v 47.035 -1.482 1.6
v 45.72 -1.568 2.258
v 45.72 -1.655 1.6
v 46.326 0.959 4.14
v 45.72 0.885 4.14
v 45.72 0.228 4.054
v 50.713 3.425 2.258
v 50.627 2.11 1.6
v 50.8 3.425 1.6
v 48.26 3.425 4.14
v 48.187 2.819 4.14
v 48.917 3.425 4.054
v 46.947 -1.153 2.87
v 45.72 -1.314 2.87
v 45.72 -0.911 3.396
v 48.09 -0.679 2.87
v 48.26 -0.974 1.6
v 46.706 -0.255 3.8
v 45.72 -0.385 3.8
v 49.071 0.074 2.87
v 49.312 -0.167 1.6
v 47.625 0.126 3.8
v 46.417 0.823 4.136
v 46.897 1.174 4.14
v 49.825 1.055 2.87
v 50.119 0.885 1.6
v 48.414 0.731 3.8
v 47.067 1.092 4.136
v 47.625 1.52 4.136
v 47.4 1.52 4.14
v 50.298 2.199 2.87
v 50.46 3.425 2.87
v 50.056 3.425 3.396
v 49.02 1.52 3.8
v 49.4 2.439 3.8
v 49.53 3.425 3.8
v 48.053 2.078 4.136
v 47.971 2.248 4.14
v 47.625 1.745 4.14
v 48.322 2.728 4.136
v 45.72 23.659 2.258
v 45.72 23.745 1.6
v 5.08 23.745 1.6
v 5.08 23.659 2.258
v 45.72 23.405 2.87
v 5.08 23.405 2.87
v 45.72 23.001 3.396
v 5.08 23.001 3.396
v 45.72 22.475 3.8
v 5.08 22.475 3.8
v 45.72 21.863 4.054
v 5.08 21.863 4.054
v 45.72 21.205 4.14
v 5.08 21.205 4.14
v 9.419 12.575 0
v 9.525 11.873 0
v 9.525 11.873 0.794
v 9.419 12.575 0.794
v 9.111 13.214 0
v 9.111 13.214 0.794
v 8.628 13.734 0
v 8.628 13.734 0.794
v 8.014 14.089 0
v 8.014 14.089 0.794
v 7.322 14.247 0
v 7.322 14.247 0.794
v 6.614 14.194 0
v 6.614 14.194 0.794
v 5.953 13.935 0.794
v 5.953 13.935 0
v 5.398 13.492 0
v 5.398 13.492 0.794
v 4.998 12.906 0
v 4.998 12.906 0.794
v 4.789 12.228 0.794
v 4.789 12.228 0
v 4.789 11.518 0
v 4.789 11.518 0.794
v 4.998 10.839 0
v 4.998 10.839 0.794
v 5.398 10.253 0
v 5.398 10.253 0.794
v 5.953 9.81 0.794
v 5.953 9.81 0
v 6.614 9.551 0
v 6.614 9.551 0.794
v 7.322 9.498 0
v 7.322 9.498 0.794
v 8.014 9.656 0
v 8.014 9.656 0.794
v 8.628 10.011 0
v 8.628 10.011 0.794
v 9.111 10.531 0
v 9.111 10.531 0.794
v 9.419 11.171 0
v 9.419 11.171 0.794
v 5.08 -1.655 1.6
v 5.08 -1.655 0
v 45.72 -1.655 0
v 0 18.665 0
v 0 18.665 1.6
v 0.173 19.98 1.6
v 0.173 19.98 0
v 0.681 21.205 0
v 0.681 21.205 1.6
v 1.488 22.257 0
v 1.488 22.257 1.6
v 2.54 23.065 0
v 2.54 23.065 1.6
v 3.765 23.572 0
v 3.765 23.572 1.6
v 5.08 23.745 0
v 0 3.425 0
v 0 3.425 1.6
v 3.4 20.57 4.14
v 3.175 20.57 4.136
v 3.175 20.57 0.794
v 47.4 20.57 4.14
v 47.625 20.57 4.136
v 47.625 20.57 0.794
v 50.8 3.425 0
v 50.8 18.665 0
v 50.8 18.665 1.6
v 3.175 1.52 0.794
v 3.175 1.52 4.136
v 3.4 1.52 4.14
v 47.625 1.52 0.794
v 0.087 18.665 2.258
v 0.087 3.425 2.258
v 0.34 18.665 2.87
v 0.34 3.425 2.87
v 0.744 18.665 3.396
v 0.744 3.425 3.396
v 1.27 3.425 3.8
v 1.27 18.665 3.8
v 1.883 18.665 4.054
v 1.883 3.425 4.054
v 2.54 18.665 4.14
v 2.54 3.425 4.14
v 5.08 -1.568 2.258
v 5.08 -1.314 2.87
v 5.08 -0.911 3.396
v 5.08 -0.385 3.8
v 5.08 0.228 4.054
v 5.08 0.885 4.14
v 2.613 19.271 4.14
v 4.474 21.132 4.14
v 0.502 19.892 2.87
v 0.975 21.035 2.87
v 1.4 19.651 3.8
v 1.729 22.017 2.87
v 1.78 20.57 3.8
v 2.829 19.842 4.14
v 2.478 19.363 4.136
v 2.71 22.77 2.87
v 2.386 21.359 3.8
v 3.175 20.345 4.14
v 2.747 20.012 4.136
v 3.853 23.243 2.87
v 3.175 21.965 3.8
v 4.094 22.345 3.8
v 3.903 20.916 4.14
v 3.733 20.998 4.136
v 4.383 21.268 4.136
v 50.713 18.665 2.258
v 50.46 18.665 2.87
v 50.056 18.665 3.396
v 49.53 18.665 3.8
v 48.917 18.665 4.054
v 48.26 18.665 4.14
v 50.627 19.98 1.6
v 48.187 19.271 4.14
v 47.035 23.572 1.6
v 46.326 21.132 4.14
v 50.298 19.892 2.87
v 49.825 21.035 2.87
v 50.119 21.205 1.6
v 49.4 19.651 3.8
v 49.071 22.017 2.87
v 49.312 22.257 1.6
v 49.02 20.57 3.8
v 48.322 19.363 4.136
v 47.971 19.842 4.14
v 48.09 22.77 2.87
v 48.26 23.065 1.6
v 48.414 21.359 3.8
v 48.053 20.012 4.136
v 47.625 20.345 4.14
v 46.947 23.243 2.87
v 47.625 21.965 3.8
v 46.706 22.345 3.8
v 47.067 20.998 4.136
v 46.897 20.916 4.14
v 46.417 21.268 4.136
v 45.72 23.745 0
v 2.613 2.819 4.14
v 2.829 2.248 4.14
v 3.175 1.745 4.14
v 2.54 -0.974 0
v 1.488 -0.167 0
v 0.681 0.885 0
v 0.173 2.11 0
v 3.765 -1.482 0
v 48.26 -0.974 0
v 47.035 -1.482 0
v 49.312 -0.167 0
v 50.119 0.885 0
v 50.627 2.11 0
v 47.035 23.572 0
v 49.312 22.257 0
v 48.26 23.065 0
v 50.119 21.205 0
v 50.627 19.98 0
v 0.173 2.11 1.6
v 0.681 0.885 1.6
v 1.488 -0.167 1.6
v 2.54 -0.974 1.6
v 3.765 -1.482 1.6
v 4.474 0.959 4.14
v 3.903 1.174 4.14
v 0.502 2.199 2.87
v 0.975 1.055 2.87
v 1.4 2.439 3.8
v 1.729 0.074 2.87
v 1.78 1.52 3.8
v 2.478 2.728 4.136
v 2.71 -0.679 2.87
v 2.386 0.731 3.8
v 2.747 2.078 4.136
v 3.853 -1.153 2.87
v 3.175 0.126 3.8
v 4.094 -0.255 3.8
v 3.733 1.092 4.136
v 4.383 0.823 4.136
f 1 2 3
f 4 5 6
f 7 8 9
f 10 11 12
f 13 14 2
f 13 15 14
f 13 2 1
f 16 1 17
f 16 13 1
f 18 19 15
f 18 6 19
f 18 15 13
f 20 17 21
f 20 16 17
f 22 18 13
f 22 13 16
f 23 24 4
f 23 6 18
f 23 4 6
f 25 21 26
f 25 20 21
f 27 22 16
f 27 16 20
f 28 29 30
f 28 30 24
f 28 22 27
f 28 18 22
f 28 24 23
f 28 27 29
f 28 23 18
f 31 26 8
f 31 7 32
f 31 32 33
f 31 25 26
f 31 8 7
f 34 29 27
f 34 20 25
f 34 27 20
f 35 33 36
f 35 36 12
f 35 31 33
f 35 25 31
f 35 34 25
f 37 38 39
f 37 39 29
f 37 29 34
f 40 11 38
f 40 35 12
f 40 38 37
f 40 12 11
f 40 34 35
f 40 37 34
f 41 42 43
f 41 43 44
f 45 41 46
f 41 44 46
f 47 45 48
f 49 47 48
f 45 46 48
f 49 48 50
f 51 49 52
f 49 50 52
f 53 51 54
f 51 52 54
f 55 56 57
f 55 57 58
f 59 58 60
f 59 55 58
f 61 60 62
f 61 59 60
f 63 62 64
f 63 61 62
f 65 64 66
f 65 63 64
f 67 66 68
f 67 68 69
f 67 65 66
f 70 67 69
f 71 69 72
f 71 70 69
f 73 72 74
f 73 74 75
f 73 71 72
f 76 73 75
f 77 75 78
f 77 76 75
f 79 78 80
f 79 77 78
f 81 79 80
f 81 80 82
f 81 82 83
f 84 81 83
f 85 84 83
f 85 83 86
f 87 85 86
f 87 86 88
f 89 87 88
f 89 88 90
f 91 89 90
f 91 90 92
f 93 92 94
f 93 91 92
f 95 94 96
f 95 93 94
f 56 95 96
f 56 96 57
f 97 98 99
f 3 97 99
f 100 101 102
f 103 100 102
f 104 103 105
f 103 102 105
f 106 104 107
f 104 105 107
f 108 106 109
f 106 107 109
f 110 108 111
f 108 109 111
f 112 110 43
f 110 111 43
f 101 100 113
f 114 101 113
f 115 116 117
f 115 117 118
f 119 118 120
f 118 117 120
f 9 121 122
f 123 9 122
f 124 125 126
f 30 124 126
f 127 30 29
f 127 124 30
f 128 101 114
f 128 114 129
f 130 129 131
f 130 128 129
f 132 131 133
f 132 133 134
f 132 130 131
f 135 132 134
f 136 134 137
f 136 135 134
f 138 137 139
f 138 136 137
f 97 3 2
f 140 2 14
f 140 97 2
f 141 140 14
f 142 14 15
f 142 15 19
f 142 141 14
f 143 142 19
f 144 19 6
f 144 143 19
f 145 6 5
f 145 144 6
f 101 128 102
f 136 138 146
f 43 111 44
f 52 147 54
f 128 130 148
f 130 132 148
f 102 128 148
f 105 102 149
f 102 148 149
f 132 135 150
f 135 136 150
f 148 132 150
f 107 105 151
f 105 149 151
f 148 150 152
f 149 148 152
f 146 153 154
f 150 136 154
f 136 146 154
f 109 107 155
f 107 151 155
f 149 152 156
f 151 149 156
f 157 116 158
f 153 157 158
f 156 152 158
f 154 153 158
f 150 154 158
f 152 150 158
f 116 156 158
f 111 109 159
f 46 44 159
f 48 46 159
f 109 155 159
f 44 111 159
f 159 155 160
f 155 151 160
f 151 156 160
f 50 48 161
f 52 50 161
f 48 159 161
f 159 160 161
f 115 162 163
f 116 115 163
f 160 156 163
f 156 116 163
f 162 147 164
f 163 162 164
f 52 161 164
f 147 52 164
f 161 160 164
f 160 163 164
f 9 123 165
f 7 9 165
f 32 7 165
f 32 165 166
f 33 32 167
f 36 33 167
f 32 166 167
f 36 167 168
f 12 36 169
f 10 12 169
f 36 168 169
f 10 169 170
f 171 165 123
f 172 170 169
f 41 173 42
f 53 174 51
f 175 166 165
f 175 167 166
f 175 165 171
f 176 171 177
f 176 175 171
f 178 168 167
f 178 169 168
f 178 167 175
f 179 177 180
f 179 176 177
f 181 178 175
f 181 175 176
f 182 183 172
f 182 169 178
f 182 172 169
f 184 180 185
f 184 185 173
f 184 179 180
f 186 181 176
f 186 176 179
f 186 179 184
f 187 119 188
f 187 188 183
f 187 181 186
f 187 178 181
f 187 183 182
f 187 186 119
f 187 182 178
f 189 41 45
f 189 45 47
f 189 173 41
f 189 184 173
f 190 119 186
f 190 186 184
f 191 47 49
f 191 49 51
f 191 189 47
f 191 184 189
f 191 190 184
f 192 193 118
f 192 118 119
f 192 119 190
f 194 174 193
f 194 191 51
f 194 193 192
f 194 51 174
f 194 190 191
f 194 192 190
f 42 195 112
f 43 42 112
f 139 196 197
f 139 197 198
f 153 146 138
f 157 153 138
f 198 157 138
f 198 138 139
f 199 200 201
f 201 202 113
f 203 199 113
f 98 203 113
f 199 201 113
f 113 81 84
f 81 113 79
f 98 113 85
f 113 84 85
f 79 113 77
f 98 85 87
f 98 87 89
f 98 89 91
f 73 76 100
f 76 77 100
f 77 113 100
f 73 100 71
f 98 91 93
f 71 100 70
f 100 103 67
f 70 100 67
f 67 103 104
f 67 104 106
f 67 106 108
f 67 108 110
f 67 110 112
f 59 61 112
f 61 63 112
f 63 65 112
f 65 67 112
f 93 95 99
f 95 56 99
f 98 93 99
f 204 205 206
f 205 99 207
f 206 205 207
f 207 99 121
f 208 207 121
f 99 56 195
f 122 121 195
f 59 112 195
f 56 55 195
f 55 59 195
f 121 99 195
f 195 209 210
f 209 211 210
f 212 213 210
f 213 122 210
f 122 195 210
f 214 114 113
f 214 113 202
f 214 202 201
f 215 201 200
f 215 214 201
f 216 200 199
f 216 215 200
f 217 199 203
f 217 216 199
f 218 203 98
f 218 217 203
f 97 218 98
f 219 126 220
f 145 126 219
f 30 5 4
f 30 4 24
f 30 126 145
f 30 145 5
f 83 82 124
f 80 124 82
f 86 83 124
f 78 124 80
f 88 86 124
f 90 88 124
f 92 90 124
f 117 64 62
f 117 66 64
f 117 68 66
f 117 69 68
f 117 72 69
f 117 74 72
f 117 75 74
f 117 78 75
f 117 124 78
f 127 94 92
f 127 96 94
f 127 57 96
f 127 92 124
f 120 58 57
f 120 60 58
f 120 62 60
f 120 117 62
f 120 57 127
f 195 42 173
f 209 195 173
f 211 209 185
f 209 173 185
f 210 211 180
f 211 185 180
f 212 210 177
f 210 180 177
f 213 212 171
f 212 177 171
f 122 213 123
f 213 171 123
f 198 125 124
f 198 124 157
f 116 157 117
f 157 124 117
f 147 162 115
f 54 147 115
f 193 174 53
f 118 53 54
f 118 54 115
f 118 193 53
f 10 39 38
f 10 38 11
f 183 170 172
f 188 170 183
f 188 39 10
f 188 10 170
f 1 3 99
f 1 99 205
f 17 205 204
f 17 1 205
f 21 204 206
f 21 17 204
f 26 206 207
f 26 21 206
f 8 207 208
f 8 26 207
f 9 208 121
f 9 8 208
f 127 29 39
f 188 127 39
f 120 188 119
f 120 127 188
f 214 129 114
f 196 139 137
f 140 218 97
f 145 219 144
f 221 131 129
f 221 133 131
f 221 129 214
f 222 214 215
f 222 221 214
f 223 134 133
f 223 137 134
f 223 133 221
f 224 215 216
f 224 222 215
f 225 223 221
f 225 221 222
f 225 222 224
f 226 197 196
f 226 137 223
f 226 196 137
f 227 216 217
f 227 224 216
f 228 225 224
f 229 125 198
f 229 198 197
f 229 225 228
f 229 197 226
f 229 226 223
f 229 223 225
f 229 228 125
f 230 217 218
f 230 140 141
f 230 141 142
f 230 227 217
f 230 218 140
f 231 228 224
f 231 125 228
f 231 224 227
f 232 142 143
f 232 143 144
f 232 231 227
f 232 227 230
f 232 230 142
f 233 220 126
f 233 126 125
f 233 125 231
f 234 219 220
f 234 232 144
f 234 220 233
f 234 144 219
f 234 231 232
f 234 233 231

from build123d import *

# Parameters (mm, degrees)
F0_W         = 44.45
F0_H         = 19.05
F0_R         = 2.38125
F1_DEPTH     = 0.79375
F2_DEPTH     = 4.1402
F3_R         = 5.08
F4_T1_DEPTH  = 40.64
F4_T3_DEPTH  = 15.24
F4_T6_ANGLE  = 90
F4_T8_ANGLE  = 90
F4_T10_ANGLE = 90
F4_T12_ANGLE = 90


# Not quite as in the source:
# - a fillet or chamfer that OpenCascade refuses, or shapes differently, is made with other operations: its cross-section is extruded or revolved along the edge and cut away or added


with BuildPart() as f1:
    # F0 (on Top) → F1 (new body)
    with BuildSketch(Plane.XY):
        with Locations((25.4, 11.0452919405)):
            Rectangle(F0_W, F0_H)
        with Locations((7.14375, 11.8726459702)):
            Circle(F0_R, mode=Mode.SUBTRACT)
    extrude(amount=F1_DEPTH)

    # F0 (on Top) → F2 (join)
    with BuildSketch(Plane.XY):
        Polygon((0, 23.7452919405), (0, 0), (0, -1.6547080595), (50.8, -1.6547080595), (50.8, 23.7452919405), align=None)
        with Locations((25.4, 11.0452919405)):
            Rectangle(F0_W, F0_H, mode=Mode.SUBTRACT)
    extrude(amount=F2_DEPTH)

    # F3
    f3_edges = [f1.edges().sort_by_distance(p)[0] for p in [
        (50.8, -1.654708, 2.0701),
        (0, -1.654708, 2.0701),
        (50.8, 23.745292, 2.0701),
        (0, 23.745292, 2.0701),
    ]]
    fillet(f3_edges, radius=F3_R)

    # F4: fillet of radius 2.54 on 8 edges, made by hand

    # F4_s2 → F4_t1 (cut)
    with BuildSketch(Plane.YZ.offset(5.08)):
        with BuildLine():
            ThreePointArc((-1.6547080595, 1.6002), (-0.9107592837, 3.3962512242), (0.8852919405, 4.1402))
            Line((0.8852919405, 4.1402), (-1.6547080595, 4.1402))
            Line((-1.6547080595, 4.1402), (-1.6547080595, 1.6002))
        make_face()
        with BuildLine():
            ThreePointArc((23.7452919405, 1.6002), (23.0013431647, 3.3962512242), (21.2052919405, 4.1402))
            Line((21.2052919405, 4.1402), (23.7452919405, 4.1402))
            Line((23.7452919405, 4.1402), (23.7452919405, 1.6002))
        make_face()
    extrude(amount=F4_T1_DEPTH, mode=Mode.SUBTRACT)

    # F4_s4 → F4_t3 (cut)
    with BuildSketch(Plane.XZ.offset(-18.6652919405)):
        with BuildLine():
            ThreePointArc((0, 1.6002), (0.7439487758, 3.3962512242), (2.54, 4.1402))
            Line((2.54, 4.1402), (0, 4.1402))
            Line((0, 4.1402), (0, 1.6002))
        make_face()
        with BuildLine():
            ThreePointArc((50.8, 1.6002), (50.0560512242, 3.3962512242), (48.26, 4.1402))
            Line((48.26, 4.1402), (50.8, 4.1402))
            Line((50.8, 4.1402), (50.8, 1.6002))
        make_face()
    extrude(amount=F4_T3_DEPTH, mode=Mode.SUBTRACT)

    # F4_s5 → F4_t6 (revolve, cut)
    with BuildSketch(Plane.XZ.offset(-18.6652919405)):
        with BuildLine():
            ThreePointArc((0, 1.6002), (0.7439487758, 3.3962512242), (2.54, 4.1402))
            Line((2.54, 4.1402), (0, 4.1402))
            Line((0, 4.1402), (0, 1.6002))
        make_face()
    revolve(axis=Axis((5.08, 18.6652919405, 4.1402), (0, 0, -1)), revolution_arc=F4_T6_ANGLE, mode=Mode.SUBTRACT)

    # F4_s7 → F4_t8 (revolve, cut)
    with BuildSketch(Plane.XZ.offset(-3.4252919405)):
        with BuildLine():
            ThreePointArc((0, 1.6002), (0.7439487758, 3.3962512242), (2.54, 4.1402))
            Line((2.54, 4.1402), (0, 4.1402))
            Line((0, 4.1402), (0, 1.6002))
        make_face()
    revolve(axis=Axis((5.08, 3.4252919405, 4.1402), (0, 0, 1)), revolution_arc=F4_T8_ANGLE, mode=Mode.SUBTRACT)

    # F4_s9 → F4_t10 (revolve, cut)
    with BuildSketch(Plane.XZ.offset(-18.6652919405)):
        with BuildLine():
            ThreePointArc((50.8, 1.6002), (50.0560512242, 3.3962512242), (48.26, 4.1402))
            Line((48.26, 4.1402), (50.8, 4.1402))
            Line((50.8, 4.1402), (50.8, 1.6002))
        make_face()
    revolve(axis=Axis((45.72, 18.6652919405, 4.1402), (0, 0, 1)), revolution_arc=F4_T10_ANGLE, mode=Mode.SUBTRACT)

    # F4_s11 → F4_t12 (revolve, cut)
    with BuildSketch(Plane.YZ.offset(45.72)):
        with BuildLine():
            ThreePointArc((-1.6547080595, 1.6002), (-0.9107592837, 3.3962512242), (0.8852919405, 4.1402))
            Line((0.8852919405, 4.1402), (-1.6547080595, 4.1402))
            Line((-1.6547080595, 4.1402), (-1.6547080595, 1.6002))
        make_face()
    revolve(axis=Axis((45.72, 3.4252919405, 4.1402), (0, 0, 1)), revolution_arc=F4_T12_ANGLE, mode=Mode.SUBTRACT)


solid = f1.part
